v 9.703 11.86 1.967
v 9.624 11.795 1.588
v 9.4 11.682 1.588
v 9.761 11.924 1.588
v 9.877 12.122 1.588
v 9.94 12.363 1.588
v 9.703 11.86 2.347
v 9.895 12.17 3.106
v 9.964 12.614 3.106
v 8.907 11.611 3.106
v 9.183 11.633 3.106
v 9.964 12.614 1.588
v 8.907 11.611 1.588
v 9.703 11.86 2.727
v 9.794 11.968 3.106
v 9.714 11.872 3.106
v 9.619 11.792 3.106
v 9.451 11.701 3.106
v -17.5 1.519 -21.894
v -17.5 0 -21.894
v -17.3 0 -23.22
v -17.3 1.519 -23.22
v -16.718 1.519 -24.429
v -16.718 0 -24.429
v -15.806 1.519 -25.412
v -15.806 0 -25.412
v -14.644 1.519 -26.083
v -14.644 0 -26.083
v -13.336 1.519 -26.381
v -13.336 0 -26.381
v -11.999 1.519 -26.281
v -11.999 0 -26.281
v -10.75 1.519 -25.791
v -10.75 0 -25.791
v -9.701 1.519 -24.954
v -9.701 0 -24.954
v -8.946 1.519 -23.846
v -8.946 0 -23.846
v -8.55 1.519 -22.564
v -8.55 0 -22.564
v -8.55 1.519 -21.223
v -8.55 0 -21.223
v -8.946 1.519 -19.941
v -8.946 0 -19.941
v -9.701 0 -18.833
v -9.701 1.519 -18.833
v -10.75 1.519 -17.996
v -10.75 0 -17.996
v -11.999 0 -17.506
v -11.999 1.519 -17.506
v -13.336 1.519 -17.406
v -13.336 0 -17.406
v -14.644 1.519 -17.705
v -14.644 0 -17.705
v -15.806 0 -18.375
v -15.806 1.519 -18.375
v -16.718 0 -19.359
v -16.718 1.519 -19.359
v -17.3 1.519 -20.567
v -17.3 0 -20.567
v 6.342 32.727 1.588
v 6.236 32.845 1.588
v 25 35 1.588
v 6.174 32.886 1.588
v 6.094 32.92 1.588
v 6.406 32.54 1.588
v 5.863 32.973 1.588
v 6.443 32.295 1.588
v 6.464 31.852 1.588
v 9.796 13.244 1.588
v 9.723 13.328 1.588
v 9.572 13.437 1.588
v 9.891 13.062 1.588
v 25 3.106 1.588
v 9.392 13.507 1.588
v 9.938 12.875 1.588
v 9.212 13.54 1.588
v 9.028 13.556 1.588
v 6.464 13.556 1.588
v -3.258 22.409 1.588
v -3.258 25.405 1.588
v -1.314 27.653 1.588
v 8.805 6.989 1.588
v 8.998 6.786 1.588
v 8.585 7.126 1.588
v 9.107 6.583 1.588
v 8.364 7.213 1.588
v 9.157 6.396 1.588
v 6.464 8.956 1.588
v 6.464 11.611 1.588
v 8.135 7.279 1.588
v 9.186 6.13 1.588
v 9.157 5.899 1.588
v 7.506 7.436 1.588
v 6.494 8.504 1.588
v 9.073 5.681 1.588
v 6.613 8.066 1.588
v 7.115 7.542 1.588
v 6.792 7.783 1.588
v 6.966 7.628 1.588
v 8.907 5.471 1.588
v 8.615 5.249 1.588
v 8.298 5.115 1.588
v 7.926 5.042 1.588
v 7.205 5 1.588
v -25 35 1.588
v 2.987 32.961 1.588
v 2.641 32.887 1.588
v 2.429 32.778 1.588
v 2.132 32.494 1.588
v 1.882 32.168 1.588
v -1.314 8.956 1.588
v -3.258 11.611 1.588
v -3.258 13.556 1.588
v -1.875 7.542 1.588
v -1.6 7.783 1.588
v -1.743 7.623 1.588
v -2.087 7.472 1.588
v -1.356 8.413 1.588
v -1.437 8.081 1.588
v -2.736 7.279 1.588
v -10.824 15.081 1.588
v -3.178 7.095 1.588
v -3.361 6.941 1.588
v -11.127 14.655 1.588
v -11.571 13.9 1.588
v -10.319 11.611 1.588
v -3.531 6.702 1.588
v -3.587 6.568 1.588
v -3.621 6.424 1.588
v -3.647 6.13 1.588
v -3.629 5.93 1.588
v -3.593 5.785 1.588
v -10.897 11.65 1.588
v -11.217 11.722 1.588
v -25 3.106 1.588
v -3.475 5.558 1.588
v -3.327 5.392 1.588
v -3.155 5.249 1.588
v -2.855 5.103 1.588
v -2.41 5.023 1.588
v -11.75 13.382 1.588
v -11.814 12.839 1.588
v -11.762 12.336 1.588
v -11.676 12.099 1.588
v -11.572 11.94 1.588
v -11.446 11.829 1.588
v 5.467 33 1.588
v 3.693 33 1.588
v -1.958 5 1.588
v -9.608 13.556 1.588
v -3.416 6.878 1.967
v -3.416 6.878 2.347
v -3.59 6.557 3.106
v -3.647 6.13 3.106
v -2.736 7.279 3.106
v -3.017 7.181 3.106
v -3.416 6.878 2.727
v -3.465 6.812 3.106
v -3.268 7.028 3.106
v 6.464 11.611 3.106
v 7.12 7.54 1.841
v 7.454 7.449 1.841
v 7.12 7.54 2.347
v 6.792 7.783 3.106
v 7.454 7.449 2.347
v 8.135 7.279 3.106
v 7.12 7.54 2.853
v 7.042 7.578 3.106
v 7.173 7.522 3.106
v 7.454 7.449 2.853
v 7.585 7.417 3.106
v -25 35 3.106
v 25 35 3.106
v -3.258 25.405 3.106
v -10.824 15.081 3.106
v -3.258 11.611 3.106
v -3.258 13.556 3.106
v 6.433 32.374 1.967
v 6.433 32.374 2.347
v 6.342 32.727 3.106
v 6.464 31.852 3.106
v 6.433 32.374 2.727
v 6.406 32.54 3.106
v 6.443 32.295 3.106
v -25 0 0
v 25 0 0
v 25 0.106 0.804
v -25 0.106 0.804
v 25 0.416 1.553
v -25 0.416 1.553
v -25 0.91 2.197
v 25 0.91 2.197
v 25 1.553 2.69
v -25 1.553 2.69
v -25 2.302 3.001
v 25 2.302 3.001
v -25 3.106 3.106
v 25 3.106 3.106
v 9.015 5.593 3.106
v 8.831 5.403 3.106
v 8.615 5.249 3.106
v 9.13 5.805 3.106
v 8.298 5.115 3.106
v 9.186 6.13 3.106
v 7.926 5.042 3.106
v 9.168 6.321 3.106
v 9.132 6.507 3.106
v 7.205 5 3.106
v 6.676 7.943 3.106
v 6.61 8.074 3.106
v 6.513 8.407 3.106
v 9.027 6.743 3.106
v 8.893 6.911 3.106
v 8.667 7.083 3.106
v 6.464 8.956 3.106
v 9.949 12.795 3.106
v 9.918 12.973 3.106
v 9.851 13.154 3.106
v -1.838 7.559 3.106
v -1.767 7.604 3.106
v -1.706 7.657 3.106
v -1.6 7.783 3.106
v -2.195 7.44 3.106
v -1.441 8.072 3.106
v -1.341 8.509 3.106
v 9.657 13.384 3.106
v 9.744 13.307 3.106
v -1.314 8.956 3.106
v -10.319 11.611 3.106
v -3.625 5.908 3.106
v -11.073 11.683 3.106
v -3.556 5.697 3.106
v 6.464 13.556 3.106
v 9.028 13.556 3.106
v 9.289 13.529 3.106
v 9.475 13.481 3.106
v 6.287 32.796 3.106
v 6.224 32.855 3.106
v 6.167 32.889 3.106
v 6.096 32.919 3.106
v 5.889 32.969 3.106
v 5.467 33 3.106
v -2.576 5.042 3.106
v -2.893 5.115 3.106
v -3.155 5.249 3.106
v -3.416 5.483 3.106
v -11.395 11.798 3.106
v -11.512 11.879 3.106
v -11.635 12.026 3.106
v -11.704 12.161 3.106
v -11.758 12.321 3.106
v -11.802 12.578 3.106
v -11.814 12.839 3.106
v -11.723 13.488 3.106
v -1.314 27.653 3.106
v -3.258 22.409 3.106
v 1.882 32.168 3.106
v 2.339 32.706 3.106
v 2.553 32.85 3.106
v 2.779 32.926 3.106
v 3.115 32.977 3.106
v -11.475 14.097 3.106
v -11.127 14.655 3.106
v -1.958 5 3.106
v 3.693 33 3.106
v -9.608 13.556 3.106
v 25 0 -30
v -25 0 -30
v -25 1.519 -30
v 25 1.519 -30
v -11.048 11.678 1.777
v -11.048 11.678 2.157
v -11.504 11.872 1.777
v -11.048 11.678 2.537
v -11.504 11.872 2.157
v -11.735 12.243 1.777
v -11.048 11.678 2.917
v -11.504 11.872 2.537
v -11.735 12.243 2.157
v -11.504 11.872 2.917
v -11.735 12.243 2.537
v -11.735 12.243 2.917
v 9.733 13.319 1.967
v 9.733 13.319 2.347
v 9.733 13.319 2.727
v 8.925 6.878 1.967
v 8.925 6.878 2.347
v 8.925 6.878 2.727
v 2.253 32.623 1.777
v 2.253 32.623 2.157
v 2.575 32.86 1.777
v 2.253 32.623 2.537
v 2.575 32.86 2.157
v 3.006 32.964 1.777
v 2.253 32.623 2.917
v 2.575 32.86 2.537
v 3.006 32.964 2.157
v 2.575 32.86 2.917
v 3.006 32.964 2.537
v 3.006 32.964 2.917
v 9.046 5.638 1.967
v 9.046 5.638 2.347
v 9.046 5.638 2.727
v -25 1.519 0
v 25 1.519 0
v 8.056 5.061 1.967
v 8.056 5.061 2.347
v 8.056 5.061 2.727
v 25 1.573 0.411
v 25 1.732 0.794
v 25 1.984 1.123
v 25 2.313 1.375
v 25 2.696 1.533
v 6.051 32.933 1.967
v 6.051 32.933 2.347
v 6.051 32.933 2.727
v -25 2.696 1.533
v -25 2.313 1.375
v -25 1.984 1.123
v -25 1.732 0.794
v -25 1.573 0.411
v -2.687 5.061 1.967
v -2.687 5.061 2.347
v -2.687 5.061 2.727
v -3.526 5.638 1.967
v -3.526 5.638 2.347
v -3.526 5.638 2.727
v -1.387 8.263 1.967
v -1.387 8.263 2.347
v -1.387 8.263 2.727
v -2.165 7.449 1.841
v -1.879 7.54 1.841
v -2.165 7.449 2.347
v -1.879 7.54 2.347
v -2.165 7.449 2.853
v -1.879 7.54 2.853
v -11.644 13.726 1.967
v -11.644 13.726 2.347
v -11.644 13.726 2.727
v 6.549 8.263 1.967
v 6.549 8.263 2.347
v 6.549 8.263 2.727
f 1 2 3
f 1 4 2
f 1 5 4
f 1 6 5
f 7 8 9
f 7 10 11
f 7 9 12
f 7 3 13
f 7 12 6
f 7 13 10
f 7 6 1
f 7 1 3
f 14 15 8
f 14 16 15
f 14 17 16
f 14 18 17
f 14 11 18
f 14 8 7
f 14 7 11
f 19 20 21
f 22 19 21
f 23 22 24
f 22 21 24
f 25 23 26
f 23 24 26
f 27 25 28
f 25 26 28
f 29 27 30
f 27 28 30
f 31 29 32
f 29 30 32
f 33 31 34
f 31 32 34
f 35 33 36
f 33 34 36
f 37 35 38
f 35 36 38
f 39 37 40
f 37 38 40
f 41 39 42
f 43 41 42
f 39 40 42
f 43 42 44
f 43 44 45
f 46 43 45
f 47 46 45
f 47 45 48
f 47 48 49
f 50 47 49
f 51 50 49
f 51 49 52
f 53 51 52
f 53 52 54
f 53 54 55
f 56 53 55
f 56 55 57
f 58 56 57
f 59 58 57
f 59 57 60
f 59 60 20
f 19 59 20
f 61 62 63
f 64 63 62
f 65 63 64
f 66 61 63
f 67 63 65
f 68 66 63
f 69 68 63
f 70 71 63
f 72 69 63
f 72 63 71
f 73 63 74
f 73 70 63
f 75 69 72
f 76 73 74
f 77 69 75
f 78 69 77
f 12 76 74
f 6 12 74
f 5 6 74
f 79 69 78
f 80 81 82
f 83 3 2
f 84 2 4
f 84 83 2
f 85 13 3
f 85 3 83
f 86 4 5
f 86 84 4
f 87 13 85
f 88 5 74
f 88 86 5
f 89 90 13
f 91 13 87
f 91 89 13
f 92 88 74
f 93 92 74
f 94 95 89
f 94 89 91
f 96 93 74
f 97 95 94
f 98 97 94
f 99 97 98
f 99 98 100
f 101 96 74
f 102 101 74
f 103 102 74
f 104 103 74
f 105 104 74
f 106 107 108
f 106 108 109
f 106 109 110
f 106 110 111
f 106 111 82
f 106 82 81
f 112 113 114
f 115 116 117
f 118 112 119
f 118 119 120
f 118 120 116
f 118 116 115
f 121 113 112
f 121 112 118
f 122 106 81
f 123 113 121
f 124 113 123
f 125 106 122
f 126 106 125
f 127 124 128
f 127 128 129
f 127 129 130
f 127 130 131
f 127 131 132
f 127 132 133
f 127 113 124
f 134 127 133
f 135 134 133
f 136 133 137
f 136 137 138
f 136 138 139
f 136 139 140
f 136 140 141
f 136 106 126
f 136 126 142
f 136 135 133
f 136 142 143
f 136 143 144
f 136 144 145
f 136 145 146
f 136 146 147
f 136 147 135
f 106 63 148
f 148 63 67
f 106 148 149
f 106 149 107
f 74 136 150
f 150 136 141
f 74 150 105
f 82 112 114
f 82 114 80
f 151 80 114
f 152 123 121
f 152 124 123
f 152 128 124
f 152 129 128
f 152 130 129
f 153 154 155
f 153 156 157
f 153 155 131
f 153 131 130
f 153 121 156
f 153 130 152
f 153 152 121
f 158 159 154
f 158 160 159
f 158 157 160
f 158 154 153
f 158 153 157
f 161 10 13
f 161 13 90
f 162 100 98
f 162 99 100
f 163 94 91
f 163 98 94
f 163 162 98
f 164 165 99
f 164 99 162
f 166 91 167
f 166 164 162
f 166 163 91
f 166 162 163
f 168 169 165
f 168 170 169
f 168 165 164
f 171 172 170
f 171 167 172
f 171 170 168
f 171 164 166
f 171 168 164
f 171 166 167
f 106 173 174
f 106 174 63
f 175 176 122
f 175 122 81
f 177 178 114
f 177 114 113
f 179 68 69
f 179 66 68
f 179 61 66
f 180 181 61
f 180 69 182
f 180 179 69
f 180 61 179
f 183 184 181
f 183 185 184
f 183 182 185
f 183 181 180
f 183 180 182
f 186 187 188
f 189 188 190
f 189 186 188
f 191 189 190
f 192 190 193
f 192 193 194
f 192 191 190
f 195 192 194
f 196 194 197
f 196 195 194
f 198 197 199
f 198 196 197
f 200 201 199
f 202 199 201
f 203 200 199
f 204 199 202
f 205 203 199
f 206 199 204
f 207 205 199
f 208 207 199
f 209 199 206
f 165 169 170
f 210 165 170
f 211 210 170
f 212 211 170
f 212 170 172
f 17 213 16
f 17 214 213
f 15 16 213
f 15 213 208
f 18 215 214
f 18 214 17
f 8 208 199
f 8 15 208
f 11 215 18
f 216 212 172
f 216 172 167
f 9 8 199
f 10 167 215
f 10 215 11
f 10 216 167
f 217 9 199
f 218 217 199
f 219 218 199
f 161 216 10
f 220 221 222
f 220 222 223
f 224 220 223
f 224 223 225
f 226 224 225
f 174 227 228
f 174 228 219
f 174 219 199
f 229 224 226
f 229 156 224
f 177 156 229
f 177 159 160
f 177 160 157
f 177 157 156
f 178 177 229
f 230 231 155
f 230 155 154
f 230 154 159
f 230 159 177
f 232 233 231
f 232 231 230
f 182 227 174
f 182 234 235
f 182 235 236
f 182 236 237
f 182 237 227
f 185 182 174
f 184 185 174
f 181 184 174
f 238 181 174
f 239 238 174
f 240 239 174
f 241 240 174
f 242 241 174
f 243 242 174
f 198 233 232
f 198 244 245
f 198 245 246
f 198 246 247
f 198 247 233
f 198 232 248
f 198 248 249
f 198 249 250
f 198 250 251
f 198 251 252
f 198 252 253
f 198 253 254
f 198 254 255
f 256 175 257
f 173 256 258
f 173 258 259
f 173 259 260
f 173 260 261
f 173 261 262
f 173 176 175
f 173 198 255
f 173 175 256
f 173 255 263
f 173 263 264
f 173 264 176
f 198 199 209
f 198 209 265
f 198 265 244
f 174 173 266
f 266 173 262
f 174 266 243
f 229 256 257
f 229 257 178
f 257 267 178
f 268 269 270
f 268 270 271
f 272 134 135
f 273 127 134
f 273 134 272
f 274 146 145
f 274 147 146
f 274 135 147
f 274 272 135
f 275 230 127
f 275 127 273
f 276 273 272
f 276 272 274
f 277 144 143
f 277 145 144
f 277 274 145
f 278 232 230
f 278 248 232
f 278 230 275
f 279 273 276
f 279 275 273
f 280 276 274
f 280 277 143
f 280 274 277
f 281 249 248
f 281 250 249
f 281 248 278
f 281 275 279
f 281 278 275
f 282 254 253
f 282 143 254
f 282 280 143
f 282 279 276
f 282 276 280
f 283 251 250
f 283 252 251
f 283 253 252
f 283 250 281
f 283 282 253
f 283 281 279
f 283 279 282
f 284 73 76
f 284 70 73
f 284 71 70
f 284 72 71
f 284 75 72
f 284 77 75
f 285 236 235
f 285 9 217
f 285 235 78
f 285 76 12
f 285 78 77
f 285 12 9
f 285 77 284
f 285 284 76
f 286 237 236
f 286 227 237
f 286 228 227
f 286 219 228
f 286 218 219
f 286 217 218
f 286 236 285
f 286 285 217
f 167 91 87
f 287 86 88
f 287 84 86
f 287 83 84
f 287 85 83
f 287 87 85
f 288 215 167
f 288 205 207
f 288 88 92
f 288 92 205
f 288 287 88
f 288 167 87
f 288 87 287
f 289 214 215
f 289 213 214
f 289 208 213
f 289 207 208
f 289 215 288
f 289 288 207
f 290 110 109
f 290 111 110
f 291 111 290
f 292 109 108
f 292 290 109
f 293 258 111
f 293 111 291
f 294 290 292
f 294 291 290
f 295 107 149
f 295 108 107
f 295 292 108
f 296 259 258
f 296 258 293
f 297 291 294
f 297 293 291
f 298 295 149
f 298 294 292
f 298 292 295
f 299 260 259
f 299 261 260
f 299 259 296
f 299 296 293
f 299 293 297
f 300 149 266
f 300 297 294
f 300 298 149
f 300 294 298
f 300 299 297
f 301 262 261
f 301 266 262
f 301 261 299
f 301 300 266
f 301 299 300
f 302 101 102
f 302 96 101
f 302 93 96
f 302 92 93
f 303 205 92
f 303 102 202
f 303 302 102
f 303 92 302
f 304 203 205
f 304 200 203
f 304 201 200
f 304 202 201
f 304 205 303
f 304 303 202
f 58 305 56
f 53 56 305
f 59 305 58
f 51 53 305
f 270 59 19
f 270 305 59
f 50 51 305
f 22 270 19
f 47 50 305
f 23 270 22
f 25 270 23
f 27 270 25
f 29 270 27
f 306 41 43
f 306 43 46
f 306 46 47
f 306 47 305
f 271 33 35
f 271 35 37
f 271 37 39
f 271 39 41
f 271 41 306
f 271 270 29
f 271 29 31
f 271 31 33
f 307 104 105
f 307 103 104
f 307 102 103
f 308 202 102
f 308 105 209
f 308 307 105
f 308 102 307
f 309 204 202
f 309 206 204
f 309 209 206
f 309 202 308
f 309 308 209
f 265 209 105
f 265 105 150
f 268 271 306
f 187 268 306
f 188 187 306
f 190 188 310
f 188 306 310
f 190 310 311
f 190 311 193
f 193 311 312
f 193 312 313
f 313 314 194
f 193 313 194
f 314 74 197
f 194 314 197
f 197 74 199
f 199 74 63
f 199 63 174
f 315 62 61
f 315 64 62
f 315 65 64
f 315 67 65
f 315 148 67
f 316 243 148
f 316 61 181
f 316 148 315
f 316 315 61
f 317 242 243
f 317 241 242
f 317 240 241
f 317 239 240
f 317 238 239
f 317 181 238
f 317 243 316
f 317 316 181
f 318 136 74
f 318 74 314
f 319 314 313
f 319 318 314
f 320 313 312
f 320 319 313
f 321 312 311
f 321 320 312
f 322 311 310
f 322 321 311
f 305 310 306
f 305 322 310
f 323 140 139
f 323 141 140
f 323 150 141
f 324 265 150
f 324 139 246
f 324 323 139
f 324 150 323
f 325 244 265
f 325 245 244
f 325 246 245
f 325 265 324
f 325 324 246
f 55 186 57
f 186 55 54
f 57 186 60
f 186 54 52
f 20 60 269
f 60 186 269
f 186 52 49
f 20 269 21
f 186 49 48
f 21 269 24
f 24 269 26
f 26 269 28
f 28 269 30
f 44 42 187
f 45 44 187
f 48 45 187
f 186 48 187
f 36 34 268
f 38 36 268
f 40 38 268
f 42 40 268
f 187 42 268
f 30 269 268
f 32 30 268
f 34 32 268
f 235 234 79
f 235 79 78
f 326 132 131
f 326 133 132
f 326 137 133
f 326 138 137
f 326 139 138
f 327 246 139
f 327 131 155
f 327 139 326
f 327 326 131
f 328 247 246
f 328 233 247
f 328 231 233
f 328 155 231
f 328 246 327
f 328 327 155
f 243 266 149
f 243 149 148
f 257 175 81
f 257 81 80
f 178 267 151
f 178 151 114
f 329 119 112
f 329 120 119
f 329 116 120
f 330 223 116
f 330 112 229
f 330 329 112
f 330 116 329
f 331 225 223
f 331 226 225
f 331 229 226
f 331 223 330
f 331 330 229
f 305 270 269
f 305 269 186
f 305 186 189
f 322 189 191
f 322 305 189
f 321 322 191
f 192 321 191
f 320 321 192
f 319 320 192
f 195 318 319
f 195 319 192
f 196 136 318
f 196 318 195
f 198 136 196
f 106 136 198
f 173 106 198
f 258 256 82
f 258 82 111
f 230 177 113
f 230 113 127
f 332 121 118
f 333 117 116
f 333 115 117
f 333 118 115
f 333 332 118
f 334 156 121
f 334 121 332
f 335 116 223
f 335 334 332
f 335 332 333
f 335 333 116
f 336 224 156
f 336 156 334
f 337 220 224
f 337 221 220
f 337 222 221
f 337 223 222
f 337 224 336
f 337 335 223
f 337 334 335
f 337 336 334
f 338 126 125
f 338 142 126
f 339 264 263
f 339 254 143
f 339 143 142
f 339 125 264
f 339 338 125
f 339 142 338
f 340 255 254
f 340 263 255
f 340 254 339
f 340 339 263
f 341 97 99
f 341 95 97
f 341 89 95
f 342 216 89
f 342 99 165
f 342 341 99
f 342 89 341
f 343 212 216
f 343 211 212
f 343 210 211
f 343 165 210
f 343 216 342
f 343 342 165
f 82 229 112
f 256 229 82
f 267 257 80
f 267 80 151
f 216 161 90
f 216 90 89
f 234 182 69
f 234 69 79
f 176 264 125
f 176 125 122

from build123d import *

# Parameters (mm, degrees)
SKETCH1_W            = 50
SKETCH1_H            = 30
BASE_FLANGE1_DEPTH   = 1.51892
EDGE_FLANGE1_DEPTH   = 50
M8_CLEARANCE_HOLE1_D = 9
CUT_EXTRUDE1_DEPTH   = 55.277389816


# Sheet-metal steps are written as plain solids
with BuildPart() as part:
    # Sketch1 → Base-Flange1 (new body)
    with BuildSketch(Plane(origin=(0, 0, 0), x_dir=(1, 0, 0), z_dir=(0, 1, 0))):
        with Locations((0, 15)):
            Rectangle(SKETCH1_W, SKETCH1_H)
    extrude(amount=BASE_FLANGE1_DEPTH)

    # Edge-Flange1 section (across the edge) → Edge-Flange1 (add)
    with BuildSketch(Plane(origin=(-25, 1.51892, 1.5875), x_dir=(0, 0, -1), z_dir=(1, 0, 0))):
        with BuildLine():
            Line((-1.51892, 1.5875), (-1.51892, 33.48108))
            Line((-1.51892, 33.48108), (0, 33.48108))
            Line((0, 33.48108), (0, 1.5875))
            ThreePointArc((0, 1.5875), (0.464967985, 0.464967985), (1.5875, 0))
            Line((1.5875, 0), (1.5875, -1.51892))
            ThreePointArc((1.5875, -1.51892), (-0.609070647, -0.609070647), (-1.51892, 1.5875))
        make_face()
    extrude(amount=EDGE_FLANGE1_DEPTH)

    # M8 Clearance Hole1 (through all)
    with Locations(Plane(origin=(0, 1.51892, 0), x_dir=(1, 0, 0), z_dir=(0, 1, 0))):
        with Locations((-13, 21.89358)):
            Hole(M8_CLEARANCE_HOLE1_D / 2)

    # Sketch11 → Cut-Extrude1 (cut, through all)
    with BuildSketch(Plane.XY.offset(3.10642)):
        with BuildLine():
            Line((-1.313983013, 27.652777778), (1.882197542, 32.167534722))
            add(Edge.make_bspline(
                [(1.882197542, 32.167534722), (1.942990154, 32.25422683), (2.055720733, 32.414984053), (2.238806296, 32.612748461), (2.402031604, 32.768107394), (2.575292151, 32.867707043), (2.775618459, 32.931720261), (3.025586613, 32.967610097), (3.337632557, 33.001581085), (3.567244353, 33.000559396), (3.692961431, 33)],
                knots=[0, 0, 0, 0, 1.195193305, 2.216302741, 3.043406804, 3.730660832, 4.454688059, 5.406997193, 6.580278791, 8, 8, 8, 8], degree=3))
            Line((3.692961431, 33), (5.467266987, 33))
            add(Edge.make_bspline(
                [(5.467266987, 33), (5.577064754, 32.996788141), (5.77366231, 32.991037172), (6.032013828, 32.946349792), (6.233785133, 32.868906911), (6.308685128, 32.770626919), (6.342266987, 32.7265625)],
                knots=[0, 0, 0, 0, 1.37922202, 2.469555487, 3.31381609, 4, 4, 4, 4], degree=3))
            add(Edge.make_bspline(
                [(6.342266987, 32.7265625), (6.362353673, 32.676444121), (6.407796446, 32.563059661), (6.435754197, 32.362580464), (6.463680714, 32.121762999), (6.46375452, 31.94690658), (6.463794764, 31.8515625)],
                knots=[0, 0, 0, 0, 0.726336959, 1.64321602, 2.714914776, 4, 4, 4, 4], degree=3))
            Line((6.463794764, 31.8515625), (6.463794764, 13.555555556))
            Line((6.463794764, 13.555555556), (9.028030875, 13.555555556))
            add(Edge.make_bspline(
                [(9.028030875, 13.555555556), (9.165896219, 13.546190847), (9.419639988, 13.528954925), (9.754751832, 13.344043), (9.938206738, 13.006772556), (9.954683864, 12.75366768), (9.963794764, 12.613715278)],
                knots=[0, 0, 0, 0, 1.088306732, 2.003049094, 2.895801301, 4, 4, 4, 4], degree=3))
            add(Edge.make_bspline(
                [(9.963794764, 12.613715278), (9.953871828, 12.46514926), (9.935630574, 12.192041557), (9.724439936, 11.830921806), (9.34752556, 11.633510395), (9.062693451, 11.619043932), (8.906503098, 11.611111111)],
                knots=[0, 0, 0, 0, 1.064523988, 1.9569058, 2.879650172, 4, 4, 4, 4], degree=3))
            Line((8.906503098, 11.611111111), (6.463794764, 11.611111111))
            Line((6.463794764, 11.611111111), (6.463794764, 8.955729167))
            add(Edge.make_bspline(
                [(6.463794764, 8.955729167), (6.465256175, 8.831576902), (6.468012829, 8.59738883), (6.54117183, 8.277019076), (6.627610008, 7.995757008), (6.738971671, 7.851550593), (6.791919764, 7.782986111)],
                knots=[0, 0, 0, 0, 1.194828702, 2.253802076, 3.169751524, 4, 4, 4, 4], degree=3))
            add(Edge.make_bspline(
                [(6.791919764, 7.782986111), (6.846531378, 7.730010442), (6.944813868, 7.634672101), (7.100203776, 7.539617352), (7.27176022, 7.495886787), (7.482006075, 7.440754455), (7.780922877, 7.369916119), (8.00732939, 7.311522722), (8.134801709, 7.278645833)],
                knots=[0, 0, 0, 0, 0.938335918, 1.688688255, 2.210658911, 3.11404715, 4.375139053, 6, 6, 6, 6], degree=3))
            add(Edge.make_bspline(
                [(8.134801709, 7.278645833), (8.292748806, 7.235768373), (8.582838073, 7.157018646), (8.93848225, 6.903617509), (9.154259726, 6.543911357), (9.175060001, 6.272945389), (9.186016987, 6.130208333)],
                knots=[0, 0, 0, 0, 1.146809638, 2.106256929, 3.002430776, 4, 4, 4, 4], degree=3))
            add(Edge.make_bspline(
                [(9.186016987, 6.130208333), (9.17899553, 6.042021554), (9.165241661, 5.869278259), (9.05359535, 5.623704764), (8.862916658, 5.414842755), (8.700602579, 5.306421387), (8.614836431, 5.249131944)],
                knots=[0, 0, 0, 0, 0.958462782, 1.877469862, 2.878463071, 4, 4, 4, 4], degree=3))
            add(Edge.make_bspline(
                [(8.614836431, 5.249131944), (8.534946889, 5.209690912), (8.357433658, 5.122053596), (8.034892473, 5.049887402), (7.643647807, 5.011727038), (7.359176572, 5.004119856), (7.205114209, 5)],
                knots=[0, 0, 0, 0, 0.737495844, 1.638703467, 2.721182046, 4, 4, 4, 4], degree=3))
            Line((7.205114209, 5), (6.482023931, 5))
            Line((6.482023931, 5), (-1.33221218, 5))
            Line((-1.33221218, 5), (-1.958080236, 5))
            add(Edge.make_bspline(
                [(-1.958080236, 5), (-2.089881071, 5.00416961), (-2.333985762, 5.01189203), (-2.66895246, 5.049646344), (-2.944215562, 5.122135251), (-3.089638978, 5.209698692), (-3.155128847, 5.249131944)],
                knots=[0, 0, 0, 0, 1.275972689, 2.363193818, 3.262881972, 4, 4, 4, 4], degree=3))
            add(Edge.make_bspline(
                [(-3.155128847, 5.249131944), (-3.228690112, 5.307025561), (-3.370553227, 5.418673569), (-3.534127754, 5.628370393), (-3.631583422, 5.871216423), (-3.641971775, 6.042227184), (-3.647316347, 6.130208333)],
                knots=[0, 0, 0, 0, 1.065580224, 2.054974559, 2.999328622, 4, 4, 4, 4], degree=3))
            add(Edge.make_bspline(
                [(-3.647316347, 6.130208333), (-3.640263565, 6.272706576), (-3.626998251, 6.540726201), (-3.433693624, 6.890936561), (-3.132521052, 7.155953313), (-2.874583156, 7.235736523), (-2.735858013, 7.278645833)],
                knots=[0, 0, 0, 0, 1.059227515, 1.99226149, 2.920190418, 4, 4, 4, 4], degree=3))
            add(Edge.make_bspline(
                [(-2.735858013, 7.278645833), (-2.628596603, 7.311344749), (-2.438567719, 7.36927554), (-2.186761633, 7.442084104), (-2.007968702, 7.494958163), (-1.85808029, 7.542989269), (-1.717703343, 7.629665553), (-1.64102438, 7.729186896), (-1.599573291, 7.782986111)],
                knots=[0, 0, 0, 0, 1.58908833, 2.815296579, 3.714312333, 4.231769587, 5.044130571, 6, 6, 6, 6], degree=3))
            add(Edge.make_bspline(
                [(-1.599573291, 7.782986111), (-1.553206662, 7.852049956), (-1.454388083, 7.999241828), (-1.378985552, 8.277685094), (-1.321790362, 8.598779226), (-1.316693685, 8.831797968), (-1.313983013, 8.955729167)],
                knots=[0, 0, 0, 0, 0.808960821, 1.724092502, 2.789556825, 4, 4, 4, 4], degree=3))
            Line((-1.313983013, 8.955729167), (-1.313983013, 27.652777778))
        make_face()
        with BuildLine():
            Line((-3.258427458, 25.404513889), (-3.258427458, 22.408854167))
            Line((-3.258427458, 22.408854167), (-9.608253847, 13.555555556))
            Line((-9.608253847, 13.555555556), (-3.258427458, 13.555555556))
            Line((-3.258427458, 13.555555556), (-3.258427458, 11.611111111))
            Line((-3.258427458, 11.611111111), (-10.319191347, 11.611111111))
            add(Edge.make_bspline(
                [(-10.319191347, 11.611111111), (-10.453058826, 11.614326043), (-10.697535464, 11.62019734), (-11.030466888, 11.667544917), (-11.298322213, 11.741534104), (-11.508093604, 11.857572638), (-11.651421931, 12.033101366), (-11.747915639, 12.255162092), (-11.806947017, 12.529695798), (-11.811530061, 12.730869026), (-11.813983013, 12.838541667)],
                knots=[0, 0, 0, 0, 1.411258846, 2.577323645, 3.536890269, 4.331839585, 5.059357258, 5.881395614, 6.866073128, 8, 8, 8, 8], degree=3))
            add(Edge.make_bspline(
                [(-11.813983013, 12.838541667), (-11.805252819, 12.985215395), (-11.787239389, 13.287854337), (-11.650289436, 13.74422143), (-11.429079802, 14.206722525), (-11.230633277, 14.501805138), (-11.127351069, 14.655381944)],
                knots=[0, 0, 0, 0, 0.891359058, 1.839183926, 2.875395504, 4, 4, 4, 4], degree=3))
            Line((-11.127351069, 14.655381944), (-10.823531625, 15.080729167))
            Line((-10.823531625, 15.080729167), (-3.258427458, 25.404513889))
        make_face()
    extrude(amount=-CUT_EXTRUDE1_DEPTH, mode=Mode.SUBTRACT)


solid = part.part
